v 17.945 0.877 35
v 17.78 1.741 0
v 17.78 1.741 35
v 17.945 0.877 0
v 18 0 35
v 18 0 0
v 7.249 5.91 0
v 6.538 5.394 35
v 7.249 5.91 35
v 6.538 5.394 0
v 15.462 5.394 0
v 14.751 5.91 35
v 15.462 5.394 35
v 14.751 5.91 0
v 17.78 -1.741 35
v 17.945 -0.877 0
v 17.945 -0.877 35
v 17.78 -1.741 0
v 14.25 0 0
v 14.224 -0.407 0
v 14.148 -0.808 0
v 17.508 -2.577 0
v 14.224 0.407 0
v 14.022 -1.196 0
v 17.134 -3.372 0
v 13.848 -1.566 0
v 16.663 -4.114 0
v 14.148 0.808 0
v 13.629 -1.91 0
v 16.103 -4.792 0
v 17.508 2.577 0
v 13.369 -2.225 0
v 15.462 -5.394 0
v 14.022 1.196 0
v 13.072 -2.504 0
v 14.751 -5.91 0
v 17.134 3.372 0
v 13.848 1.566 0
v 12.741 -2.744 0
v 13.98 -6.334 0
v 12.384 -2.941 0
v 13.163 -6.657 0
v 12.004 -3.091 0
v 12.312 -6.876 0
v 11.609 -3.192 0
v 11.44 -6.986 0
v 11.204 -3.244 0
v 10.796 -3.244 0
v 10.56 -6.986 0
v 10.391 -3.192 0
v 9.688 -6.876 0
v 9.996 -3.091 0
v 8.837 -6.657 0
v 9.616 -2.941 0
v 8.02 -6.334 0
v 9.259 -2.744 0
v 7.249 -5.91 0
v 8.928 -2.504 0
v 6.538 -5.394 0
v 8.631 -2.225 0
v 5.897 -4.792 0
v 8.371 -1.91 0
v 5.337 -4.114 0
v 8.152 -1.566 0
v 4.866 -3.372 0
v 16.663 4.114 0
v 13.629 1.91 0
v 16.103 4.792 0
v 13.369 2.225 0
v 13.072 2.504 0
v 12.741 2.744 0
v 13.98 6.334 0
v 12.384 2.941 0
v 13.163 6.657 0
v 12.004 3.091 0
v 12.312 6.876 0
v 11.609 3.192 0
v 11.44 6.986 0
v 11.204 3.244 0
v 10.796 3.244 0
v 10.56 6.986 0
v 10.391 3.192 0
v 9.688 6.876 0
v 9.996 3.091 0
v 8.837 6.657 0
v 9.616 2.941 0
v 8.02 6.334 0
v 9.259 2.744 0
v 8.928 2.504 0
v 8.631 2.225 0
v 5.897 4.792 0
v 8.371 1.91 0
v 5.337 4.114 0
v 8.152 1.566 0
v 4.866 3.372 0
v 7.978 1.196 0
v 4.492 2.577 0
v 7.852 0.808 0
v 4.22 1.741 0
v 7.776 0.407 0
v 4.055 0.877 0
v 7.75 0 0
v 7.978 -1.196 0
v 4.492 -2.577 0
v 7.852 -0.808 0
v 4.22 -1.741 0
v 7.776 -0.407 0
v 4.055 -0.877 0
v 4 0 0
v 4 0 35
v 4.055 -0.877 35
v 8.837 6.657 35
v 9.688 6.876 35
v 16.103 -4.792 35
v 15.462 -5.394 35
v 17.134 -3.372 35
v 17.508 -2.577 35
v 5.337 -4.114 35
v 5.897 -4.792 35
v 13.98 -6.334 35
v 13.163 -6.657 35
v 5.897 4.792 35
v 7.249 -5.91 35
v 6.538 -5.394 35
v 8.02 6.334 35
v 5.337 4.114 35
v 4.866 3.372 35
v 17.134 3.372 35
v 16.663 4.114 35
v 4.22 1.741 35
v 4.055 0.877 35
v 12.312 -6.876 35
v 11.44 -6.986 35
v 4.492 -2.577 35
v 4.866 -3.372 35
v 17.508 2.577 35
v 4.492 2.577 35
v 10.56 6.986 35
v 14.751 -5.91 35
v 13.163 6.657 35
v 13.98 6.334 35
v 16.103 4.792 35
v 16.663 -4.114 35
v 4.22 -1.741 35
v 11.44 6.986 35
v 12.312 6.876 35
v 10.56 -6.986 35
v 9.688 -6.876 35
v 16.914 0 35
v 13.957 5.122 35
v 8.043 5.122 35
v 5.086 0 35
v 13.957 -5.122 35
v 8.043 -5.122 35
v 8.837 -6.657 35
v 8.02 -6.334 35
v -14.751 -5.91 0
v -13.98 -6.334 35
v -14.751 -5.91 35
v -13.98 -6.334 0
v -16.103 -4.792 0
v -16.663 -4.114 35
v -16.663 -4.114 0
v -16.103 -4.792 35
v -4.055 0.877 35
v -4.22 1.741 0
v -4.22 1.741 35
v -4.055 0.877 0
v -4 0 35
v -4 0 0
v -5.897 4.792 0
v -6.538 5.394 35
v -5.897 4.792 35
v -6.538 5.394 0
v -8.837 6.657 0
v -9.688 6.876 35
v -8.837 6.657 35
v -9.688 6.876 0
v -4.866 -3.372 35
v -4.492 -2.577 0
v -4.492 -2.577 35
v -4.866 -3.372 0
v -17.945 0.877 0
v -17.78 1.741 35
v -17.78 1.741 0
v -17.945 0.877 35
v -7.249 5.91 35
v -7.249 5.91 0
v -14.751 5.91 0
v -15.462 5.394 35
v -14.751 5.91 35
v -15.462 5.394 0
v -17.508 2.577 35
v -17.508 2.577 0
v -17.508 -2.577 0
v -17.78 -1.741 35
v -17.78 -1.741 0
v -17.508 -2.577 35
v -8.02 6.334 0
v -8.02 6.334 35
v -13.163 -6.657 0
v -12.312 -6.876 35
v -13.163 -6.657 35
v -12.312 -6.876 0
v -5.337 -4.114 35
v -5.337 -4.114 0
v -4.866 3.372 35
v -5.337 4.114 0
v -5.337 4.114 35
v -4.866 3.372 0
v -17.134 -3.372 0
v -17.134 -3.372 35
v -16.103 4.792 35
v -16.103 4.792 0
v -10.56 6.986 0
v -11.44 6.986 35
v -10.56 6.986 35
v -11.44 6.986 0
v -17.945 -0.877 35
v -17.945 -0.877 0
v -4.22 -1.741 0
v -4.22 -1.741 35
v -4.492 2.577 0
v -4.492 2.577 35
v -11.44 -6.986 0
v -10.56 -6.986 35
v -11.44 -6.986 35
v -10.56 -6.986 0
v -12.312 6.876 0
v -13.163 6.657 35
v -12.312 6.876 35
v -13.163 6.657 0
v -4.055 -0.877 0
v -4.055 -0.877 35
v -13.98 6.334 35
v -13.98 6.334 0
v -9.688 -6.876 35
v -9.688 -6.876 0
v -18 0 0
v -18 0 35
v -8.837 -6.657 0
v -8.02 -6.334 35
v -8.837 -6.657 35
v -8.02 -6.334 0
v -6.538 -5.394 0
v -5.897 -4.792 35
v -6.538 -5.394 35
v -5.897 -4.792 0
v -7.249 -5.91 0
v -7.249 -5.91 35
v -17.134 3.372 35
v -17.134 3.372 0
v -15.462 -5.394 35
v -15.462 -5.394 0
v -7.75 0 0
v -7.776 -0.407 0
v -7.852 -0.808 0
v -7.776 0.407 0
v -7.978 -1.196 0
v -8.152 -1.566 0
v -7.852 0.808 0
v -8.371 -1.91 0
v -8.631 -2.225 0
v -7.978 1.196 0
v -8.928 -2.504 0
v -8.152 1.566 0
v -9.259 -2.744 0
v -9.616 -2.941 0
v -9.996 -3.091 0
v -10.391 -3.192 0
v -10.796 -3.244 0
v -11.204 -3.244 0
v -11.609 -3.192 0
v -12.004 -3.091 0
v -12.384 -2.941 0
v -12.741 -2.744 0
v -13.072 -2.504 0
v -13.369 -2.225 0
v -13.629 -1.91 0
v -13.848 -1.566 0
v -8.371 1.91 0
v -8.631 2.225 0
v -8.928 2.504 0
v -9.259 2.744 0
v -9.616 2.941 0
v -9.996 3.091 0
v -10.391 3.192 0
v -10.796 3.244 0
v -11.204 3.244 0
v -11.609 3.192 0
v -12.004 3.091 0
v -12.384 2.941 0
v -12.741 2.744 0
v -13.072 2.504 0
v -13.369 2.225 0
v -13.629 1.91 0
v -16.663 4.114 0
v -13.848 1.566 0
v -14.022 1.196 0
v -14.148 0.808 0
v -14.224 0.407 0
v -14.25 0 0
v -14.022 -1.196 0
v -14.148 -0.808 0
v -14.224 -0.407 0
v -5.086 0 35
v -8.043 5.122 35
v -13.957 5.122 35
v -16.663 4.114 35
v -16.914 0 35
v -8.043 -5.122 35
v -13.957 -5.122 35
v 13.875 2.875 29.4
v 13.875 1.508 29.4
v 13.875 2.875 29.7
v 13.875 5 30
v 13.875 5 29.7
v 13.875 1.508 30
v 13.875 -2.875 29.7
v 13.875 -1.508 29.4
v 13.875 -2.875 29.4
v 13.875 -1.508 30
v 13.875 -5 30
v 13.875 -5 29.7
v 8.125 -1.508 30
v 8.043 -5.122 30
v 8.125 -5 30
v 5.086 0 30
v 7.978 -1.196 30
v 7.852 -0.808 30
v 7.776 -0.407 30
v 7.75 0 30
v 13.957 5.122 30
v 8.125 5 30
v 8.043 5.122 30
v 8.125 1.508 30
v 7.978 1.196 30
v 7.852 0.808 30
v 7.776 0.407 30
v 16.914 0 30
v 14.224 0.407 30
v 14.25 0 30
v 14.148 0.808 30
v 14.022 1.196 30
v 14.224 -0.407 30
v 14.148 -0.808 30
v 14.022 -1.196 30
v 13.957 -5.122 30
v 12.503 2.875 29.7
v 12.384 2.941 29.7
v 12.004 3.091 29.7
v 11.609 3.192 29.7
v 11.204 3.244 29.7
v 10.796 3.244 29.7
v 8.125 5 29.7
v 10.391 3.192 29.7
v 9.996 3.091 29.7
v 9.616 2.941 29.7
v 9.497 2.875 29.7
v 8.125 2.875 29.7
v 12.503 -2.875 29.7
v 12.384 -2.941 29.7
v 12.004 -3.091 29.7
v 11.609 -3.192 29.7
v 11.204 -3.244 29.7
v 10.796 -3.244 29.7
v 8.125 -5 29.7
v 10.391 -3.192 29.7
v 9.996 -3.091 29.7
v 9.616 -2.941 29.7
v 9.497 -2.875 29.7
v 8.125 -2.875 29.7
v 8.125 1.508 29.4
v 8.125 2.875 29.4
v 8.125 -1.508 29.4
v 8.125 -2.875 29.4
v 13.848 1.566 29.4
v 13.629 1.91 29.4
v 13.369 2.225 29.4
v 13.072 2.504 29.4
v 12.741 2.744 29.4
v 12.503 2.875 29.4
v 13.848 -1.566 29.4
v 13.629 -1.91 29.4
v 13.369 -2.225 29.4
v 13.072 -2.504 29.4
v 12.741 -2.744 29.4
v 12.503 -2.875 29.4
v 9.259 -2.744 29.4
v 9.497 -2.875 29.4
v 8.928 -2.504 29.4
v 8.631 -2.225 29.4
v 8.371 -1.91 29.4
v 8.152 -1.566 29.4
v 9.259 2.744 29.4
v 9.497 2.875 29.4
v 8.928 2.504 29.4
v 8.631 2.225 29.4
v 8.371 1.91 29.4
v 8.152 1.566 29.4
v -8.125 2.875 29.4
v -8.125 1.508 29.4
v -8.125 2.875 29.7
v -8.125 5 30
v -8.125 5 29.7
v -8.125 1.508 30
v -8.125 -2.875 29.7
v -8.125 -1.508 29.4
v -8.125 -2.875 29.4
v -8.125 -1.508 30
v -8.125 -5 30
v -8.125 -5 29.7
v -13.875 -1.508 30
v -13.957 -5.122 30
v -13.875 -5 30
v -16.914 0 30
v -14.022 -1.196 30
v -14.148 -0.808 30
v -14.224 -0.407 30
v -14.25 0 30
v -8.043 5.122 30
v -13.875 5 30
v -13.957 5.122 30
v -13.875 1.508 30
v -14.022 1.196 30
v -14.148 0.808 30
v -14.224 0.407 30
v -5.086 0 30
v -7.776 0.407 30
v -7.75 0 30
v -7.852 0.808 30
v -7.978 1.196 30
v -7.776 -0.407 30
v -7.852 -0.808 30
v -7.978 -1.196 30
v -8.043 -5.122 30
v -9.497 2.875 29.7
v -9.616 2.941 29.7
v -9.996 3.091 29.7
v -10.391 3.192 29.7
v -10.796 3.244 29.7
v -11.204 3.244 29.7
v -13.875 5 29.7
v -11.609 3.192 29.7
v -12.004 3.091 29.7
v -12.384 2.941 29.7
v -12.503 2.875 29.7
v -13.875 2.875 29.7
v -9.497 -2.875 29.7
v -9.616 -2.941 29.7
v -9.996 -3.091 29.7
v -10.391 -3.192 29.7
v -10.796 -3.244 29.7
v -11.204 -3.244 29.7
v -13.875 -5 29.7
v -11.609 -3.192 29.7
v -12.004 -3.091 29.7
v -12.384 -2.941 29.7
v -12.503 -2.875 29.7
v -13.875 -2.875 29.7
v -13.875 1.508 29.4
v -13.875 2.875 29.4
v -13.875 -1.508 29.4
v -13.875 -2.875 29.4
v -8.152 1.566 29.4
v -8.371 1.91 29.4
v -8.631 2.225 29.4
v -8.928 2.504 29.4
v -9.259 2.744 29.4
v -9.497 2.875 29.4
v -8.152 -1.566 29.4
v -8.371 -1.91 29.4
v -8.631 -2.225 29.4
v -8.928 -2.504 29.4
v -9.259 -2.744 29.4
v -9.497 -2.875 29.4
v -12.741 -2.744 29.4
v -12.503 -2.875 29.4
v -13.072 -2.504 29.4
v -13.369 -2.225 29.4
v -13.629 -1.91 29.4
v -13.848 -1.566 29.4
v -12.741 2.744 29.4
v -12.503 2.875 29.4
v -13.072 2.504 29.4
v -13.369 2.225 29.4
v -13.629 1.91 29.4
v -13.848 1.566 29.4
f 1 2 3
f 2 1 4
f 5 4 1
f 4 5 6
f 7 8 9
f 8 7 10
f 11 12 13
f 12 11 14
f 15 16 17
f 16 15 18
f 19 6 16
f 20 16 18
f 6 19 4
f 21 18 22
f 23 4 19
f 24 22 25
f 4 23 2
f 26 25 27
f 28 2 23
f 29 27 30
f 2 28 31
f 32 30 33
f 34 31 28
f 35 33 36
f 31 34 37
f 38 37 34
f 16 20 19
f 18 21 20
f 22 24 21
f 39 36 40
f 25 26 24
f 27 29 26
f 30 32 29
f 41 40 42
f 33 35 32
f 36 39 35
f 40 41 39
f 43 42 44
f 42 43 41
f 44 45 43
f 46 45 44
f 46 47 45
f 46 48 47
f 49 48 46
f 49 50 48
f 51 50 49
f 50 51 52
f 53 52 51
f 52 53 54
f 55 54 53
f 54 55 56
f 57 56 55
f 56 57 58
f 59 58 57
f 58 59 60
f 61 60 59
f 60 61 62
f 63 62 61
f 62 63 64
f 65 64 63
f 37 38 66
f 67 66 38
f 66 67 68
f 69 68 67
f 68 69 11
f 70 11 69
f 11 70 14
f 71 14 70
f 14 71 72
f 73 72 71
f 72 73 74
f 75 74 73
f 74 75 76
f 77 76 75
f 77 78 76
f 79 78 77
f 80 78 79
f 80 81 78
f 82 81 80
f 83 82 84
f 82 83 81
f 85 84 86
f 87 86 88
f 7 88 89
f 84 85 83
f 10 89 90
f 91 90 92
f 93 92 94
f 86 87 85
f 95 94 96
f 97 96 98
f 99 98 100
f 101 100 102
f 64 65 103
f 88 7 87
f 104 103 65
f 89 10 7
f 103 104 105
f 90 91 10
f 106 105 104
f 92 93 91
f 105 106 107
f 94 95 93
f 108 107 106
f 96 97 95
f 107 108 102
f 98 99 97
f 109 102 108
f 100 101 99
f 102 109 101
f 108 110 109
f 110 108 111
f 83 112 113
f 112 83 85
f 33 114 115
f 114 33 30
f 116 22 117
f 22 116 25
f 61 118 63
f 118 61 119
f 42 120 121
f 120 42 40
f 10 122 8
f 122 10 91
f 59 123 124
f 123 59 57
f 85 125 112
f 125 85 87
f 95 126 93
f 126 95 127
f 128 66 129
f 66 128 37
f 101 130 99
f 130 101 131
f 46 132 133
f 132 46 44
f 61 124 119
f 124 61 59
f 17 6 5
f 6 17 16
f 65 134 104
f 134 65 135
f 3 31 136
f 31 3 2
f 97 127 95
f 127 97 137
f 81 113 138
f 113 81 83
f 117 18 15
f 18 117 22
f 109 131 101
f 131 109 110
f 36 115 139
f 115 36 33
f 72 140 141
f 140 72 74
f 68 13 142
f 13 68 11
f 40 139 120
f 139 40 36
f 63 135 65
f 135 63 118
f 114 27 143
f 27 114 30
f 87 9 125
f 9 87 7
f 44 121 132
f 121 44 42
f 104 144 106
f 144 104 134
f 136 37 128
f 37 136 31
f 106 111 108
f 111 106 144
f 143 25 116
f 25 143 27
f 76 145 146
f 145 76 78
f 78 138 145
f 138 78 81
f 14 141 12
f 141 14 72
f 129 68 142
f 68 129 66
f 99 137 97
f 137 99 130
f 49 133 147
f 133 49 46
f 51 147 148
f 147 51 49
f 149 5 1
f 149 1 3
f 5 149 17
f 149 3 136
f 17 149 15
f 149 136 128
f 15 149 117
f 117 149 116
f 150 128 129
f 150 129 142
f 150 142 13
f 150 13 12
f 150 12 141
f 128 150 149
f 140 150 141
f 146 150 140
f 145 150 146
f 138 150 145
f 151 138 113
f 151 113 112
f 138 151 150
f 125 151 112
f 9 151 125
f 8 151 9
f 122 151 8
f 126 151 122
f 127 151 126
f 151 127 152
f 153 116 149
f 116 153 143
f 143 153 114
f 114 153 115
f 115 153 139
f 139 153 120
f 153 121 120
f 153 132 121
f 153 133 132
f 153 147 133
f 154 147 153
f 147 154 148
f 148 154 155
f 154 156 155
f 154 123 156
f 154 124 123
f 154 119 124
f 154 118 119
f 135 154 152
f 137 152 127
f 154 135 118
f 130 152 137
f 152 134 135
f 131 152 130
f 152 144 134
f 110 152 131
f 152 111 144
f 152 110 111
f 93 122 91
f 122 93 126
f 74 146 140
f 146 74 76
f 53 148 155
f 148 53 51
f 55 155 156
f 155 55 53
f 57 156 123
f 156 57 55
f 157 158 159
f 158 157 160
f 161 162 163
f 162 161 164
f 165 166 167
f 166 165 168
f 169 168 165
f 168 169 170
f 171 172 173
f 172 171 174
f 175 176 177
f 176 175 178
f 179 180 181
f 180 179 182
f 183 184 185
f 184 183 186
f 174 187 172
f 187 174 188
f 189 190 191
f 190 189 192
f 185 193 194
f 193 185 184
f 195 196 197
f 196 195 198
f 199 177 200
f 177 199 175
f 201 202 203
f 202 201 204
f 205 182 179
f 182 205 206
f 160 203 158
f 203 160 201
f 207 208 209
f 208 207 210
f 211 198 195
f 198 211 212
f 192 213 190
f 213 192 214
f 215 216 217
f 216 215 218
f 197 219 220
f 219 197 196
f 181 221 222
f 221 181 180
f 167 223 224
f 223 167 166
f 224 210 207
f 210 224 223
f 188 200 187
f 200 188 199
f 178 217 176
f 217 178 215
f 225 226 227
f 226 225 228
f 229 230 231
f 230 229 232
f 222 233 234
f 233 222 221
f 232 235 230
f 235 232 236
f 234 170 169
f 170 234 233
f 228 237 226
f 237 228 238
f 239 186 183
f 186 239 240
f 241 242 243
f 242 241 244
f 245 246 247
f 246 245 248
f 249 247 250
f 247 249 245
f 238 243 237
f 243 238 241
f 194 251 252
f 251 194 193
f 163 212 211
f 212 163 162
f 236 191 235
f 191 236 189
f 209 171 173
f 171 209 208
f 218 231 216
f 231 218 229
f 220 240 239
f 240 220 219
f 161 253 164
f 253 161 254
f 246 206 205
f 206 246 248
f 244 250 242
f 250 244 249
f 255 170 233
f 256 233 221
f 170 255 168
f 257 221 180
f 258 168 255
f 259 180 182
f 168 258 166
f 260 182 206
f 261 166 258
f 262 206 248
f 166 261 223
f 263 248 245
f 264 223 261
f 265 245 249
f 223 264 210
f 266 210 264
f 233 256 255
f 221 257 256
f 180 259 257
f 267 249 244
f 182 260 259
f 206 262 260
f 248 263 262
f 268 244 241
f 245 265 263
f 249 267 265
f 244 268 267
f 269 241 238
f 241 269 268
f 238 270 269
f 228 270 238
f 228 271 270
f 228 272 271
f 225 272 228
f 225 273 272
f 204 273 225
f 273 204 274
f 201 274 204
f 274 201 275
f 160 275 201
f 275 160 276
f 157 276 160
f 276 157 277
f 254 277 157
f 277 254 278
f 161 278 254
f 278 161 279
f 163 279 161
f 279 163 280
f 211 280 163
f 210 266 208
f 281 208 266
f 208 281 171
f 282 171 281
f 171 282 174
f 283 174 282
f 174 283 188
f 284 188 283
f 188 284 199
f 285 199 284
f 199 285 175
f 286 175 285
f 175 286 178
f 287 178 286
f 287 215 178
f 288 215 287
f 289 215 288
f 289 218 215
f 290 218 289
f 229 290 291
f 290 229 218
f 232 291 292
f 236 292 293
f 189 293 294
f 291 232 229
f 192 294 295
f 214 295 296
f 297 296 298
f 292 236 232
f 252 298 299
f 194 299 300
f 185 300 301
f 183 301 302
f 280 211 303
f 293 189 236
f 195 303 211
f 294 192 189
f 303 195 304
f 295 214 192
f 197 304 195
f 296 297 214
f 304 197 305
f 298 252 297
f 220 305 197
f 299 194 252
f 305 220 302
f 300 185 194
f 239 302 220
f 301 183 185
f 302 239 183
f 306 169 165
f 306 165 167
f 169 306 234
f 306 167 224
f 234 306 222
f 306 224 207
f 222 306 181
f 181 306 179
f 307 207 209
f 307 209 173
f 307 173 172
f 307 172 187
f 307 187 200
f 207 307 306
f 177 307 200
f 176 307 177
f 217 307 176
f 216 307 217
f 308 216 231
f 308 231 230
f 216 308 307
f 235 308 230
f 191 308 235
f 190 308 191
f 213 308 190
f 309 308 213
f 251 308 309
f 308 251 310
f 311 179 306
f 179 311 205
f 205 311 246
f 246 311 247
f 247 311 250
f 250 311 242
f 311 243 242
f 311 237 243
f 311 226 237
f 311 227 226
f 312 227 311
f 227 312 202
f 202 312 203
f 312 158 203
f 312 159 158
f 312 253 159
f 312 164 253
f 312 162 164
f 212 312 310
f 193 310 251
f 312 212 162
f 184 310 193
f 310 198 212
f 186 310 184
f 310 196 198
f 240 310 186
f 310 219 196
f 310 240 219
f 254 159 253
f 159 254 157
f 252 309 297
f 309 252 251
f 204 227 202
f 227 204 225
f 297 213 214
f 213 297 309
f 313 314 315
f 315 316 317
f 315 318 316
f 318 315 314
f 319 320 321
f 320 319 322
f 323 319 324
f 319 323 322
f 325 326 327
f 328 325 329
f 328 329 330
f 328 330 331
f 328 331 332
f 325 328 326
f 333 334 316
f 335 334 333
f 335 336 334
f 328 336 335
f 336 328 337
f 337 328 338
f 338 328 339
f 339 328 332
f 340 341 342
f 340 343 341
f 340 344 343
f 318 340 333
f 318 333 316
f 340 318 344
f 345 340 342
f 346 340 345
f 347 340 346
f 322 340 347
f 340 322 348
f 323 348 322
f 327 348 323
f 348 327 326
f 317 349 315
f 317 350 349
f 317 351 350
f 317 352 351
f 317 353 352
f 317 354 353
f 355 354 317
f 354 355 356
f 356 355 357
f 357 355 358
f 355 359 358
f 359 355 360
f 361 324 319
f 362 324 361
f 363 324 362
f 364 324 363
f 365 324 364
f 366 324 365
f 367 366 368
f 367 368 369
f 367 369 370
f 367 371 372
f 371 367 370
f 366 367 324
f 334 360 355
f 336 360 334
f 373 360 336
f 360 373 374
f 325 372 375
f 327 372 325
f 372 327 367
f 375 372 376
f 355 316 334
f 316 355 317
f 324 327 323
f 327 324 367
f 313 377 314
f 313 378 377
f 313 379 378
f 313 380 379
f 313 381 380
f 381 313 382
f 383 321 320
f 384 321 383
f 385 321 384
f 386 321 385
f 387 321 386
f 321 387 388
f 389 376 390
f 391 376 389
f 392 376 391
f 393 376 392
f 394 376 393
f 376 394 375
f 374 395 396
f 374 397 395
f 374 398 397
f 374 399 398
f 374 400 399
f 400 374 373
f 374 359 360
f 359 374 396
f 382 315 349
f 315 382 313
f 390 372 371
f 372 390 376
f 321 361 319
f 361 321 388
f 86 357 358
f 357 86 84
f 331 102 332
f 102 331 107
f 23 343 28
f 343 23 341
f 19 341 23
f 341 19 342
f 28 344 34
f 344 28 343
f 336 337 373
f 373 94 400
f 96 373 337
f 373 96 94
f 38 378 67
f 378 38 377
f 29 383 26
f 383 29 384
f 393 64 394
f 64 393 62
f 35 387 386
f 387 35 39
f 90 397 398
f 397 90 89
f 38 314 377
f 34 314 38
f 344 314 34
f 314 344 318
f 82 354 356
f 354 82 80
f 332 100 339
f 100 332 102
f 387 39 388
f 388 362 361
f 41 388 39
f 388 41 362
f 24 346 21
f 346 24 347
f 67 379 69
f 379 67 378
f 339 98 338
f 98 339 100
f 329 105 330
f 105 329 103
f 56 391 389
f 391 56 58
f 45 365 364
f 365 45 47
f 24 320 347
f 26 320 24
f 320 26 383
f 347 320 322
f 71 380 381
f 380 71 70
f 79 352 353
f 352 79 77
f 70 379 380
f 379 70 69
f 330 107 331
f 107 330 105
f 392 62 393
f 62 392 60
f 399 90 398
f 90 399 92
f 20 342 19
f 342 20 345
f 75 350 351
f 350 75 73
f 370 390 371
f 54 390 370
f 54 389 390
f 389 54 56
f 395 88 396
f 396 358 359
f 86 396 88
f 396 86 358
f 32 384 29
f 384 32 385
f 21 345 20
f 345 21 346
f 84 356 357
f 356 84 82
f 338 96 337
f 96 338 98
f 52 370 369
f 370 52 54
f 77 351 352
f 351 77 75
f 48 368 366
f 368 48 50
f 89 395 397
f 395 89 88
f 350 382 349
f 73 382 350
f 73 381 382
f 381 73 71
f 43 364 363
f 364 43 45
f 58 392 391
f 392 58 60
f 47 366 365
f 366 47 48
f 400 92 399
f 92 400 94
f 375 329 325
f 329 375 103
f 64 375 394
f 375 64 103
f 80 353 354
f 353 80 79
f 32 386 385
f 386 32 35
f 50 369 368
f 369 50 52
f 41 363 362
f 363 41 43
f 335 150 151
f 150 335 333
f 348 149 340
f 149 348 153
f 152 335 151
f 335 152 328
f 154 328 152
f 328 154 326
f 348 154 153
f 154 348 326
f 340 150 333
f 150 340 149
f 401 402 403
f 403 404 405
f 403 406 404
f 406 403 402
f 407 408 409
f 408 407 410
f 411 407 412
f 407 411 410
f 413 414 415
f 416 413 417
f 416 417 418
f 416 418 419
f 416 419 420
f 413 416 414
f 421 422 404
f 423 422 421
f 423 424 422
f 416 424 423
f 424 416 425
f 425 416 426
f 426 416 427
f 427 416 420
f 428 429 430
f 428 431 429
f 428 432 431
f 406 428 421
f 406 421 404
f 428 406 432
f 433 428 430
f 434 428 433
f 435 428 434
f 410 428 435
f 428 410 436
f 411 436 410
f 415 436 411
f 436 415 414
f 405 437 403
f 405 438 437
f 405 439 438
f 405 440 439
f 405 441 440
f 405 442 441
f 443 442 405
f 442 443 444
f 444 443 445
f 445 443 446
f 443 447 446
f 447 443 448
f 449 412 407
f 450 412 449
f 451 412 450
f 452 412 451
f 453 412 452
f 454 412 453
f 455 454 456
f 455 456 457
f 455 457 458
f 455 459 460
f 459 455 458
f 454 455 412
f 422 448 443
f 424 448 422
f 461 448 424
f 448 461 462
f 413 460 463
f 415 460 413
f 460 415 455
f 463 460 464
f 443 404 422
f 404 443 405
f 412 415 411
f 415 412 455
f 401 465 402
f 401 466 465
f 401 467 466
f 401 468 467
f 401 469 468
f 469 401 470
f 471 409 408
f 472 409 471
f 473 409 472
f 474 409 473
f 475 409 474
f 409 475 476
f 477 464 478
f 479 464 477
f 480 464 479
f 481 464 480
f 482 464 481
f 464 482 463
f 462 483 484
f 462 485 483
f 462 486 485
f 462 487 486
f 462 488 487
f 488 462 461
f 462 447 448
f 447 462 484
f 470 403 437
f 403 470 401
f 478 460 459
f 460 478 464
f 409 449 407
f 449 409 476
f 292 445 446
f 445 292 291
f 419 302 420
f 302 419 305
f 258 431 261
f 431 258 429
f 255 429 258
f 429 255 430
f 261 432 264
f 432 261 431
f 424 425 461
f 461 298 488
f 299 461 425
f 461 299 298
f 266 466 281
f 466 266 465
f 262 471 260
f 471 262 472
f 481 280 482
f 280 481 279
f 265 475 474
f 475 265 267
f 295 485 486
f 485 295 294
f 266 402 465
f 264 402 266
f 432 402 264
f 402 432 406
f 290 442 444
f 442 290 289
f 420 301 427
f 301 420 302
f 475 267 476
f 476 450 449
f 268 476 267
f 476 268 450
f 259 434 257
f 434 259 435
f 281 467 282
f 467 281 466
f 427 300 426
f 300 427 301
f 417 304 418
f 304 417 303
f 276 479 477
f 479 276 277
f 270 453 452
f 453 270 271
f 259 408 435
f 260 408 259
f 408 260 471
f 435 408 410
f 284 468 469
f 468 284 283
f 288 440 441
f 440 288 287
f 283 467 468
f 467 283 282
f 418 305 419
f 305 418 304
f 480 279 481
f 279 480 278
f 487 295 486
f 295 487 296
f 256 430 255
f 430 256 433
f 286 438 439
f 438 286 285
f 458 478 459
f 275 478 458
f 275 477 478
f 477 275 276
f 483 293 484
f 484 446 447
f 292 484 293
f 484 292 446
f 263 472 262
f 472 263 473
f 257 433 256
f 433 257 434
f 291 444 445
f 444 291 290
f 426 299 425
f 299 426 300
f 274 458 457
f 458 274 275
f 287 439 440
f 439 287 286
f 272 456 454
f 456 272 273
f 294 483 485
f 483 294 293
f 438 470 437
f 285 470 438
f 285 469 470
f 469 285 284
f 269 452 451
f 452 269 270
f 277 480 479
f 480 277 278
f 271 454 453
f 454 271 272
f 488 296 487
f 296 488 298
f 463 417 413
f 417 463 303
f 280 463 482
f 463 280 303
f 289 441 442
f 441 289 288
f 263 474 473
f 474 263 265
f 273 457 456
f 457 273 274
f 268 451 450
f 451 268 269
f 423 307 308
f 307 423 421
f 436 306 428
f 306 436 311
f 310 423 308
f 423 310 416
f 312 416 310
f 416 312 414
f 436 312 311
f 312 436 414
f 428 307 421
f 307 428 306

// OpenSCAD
$fn = 50;


difference() {
	union() {
		translate(v = [11.0000000000, 0, 0.0000000000]) {
			cylinder(h = 35, r = 7.0000000000);
		}
		translate(v = [-11.0000000000, 0, 0.0000000000]) {
			cylinder(h = 35, r = 7.0000000000);
		}
	}
	union() {
		translate(v = [11.0000000000, 0, 35]) {
			rotate(a = [0, 0, 0]) {
				difference() {
					union() {
						#translate(v = [-2.8750000000, -5.0000000000, -5.3000000000]) {
							cube(size = [5.7500000000, 10, 0.3000000000]);
						}
						#translate(v = [-2.8750000000, -2.8750000000, -5.6000000000]) {
							cube(size = [5.7500000000, 5.7500000000, 0.3000000000]);
						}
						#translate(v = [-2.8750000000, -5.0000000000, 0]) {
							cube(size = [5.7500000000, 10, 0.3000000000]);
						}
						#translate(v = [-2.8750000000, -2.8750000000, 0.3000000000]) {
							cube(size = [5.7500000000, 5.7500000000, 0.3000000000]);
						}
						#translate(v = [0, 0, -100.0000000000]) {
							cylinder(h = 200, r = 3.2500000000);
						}
						translate(v = [0, 0, -5]) {
							#linear_extrude(height = 5) {
								polygon(points = [[5.9142500000, 0.0000000000], [2.9571250000, 5.1218907443], [-2.9571250000, 5.1218907443], [-5.9142500000, 0.0000000000], [-2.9571250000, -5.1218907443], [2.9571250000, -5.1218907443]]);
							}
						}
						#translate(v = [-2.8750000000, -5.0000000000, -5.3000000000]) {
							cube(size = [5.7500000000, 10, 0.3000000000]);
						}
						#translate(v = [-2.8750000000, -2.8750000000, -5.6000000000]) {
							cube(size = [5.7500000000, 5.7500000000, 0.3000000000]);
						}
						#translate(v = [-2.8750000000, -5.0000000000, 0]) {
							cube(size = [5.7500000000, 10, 0.3000000000]);
						}
						#translate(v = [-2.8750000000, -2.8750000000, 0.3000000000]) {
							cube(size = [5.7500000000, 5.7500000000, 0.3000000000]);
						}
						#translate(v = [0, 0, -100.0000000000]) {
							cylinder(h = 200, r = 3.2500000000);
						}
						#translate(v = [-2.8750000000, -5.0000000000, -5.3000000000]) {
							cube(size = [5.7500000000, 10, 0.3000000000]);
						}
						#translate(v = [-2.8750000000, -2.8750000000, -5.6000000000]) {
							cube(size = [5.7500000000, 5.7500000000, 0.3000000000]);
						}
						#translate(v = [-2.8750000000, -5.0000000000, 0]) {
							cube(size = [5.7500000000, 10, 0.3000000000]);
						}
						#translate(v = [-2.8750000000, -2.8750000000, 0.3000000000]) {
							cube(size = [5.7500000000, 5.7500000000, 0.3000000000]);
						}
						#translate(v = [0, 0, -100.0000000000]) {
							cylinder(h = 200, r = 3.2500000000);
						}
					}
					union();
				}
			}
		}
		translate(v = [-11.0000000000, 0, 35]) {
			rotate(a = [0, 0, 0]) {
				difference() {
					union() {
						#translate(v = [-2.8750000000, -5.0000000000, -5.3000000000]) {
							cube(size = [5.7500000000, 10, 0.3000000000]);
						}
						#translate(v = [-2.8750000000, -2.8750000000, -5.6000000000]) {
							cube(size = [5.7500000000, 5.7500000000, 0.3000000000]);
						}
						#translate(v = [-2.8750000000, -5.0000000000, 0]) {
							cube(size = [5.7500000000, 10, 0.3000000000]);
						}
						#translate(v = [-2.8750000000, -2.8750000000, 0.3000000000]) {
							cube(size = [5.7500000000, 5.7500000000, 0.3000000000]);
						}
						#translate(v = [0, 0, -100.0000000000]) {
							cylinder(h = 200, r = 3.2500000000);
						}
						translate(v = [0, 0, -5]) {
							#linear_extrude(height = 5) {
								polygon(points = [[5.9142500000, 0.0000000000], [2.9571250000, 5.1218907443], [-2.9571250000, 5.1218907443], [-5.9142500000, 0.0000000000], [-2.9571250000, -5.1218907443], [2.9571250000, -5.1218907443]]);
							}
						}
						#translate(v = [-2.8750000000, -5.0000000000, -5.3000000000]) {
							cube(size = [5.7500000000, 10, 0.3000000000]);
						}
						#translate(v = [-2.8750000000, -2.8750000000, -5.6000000000]) {
							cube(size = [5.7500000000, 5.7500000000, 0.3000000000]);
						}
						#translate(v = [-2.8750000000, -5.0000000000, 0]) {
							cube(size = [5.7500000000, 10, 0.3000000000]);
						}
						#translate(v = [-2.8750000000, -2.8750000000, 0.3000000000]) {
							cube(size = [5.7500000000, 5.7500000000, 0.3000000000]);
						}
						#translate(v = [0, 0, -100.0000000000]) {
							cylinder(h = 200, r = 3.2500000000);
						}
						#translate(v = [-2.8750000000, -5.0000000000, -5.3000000000]) {
							cube(size = [5.7500000000, 10, 0.3000000000]);
						}
						#translate(v = [-2.8750000000, -2.8750000000, -5.6000000000]) {
							cube(size = [5.7500000000, 5.7500000000, 0.3000000000]);
						}
						#translate(v = [-2.8750000000, -5.0000000000, 0]) {
							cube(size = [5.7500000000, 10, 0.3000000000]);
						}
						#translate(v = [-2.8750000000, -2.8750000000, 0.3000000000]) {
							cube(size = [5.7500000000, 5.7500000000, 0.3000000000]);
						}
						#translate(v = [0, 0, -100.0000000000]) {
							cylinder(h = 200, r = 3.2500000000);
						}
					}
					union();
				}
			}
		}
	}
}
